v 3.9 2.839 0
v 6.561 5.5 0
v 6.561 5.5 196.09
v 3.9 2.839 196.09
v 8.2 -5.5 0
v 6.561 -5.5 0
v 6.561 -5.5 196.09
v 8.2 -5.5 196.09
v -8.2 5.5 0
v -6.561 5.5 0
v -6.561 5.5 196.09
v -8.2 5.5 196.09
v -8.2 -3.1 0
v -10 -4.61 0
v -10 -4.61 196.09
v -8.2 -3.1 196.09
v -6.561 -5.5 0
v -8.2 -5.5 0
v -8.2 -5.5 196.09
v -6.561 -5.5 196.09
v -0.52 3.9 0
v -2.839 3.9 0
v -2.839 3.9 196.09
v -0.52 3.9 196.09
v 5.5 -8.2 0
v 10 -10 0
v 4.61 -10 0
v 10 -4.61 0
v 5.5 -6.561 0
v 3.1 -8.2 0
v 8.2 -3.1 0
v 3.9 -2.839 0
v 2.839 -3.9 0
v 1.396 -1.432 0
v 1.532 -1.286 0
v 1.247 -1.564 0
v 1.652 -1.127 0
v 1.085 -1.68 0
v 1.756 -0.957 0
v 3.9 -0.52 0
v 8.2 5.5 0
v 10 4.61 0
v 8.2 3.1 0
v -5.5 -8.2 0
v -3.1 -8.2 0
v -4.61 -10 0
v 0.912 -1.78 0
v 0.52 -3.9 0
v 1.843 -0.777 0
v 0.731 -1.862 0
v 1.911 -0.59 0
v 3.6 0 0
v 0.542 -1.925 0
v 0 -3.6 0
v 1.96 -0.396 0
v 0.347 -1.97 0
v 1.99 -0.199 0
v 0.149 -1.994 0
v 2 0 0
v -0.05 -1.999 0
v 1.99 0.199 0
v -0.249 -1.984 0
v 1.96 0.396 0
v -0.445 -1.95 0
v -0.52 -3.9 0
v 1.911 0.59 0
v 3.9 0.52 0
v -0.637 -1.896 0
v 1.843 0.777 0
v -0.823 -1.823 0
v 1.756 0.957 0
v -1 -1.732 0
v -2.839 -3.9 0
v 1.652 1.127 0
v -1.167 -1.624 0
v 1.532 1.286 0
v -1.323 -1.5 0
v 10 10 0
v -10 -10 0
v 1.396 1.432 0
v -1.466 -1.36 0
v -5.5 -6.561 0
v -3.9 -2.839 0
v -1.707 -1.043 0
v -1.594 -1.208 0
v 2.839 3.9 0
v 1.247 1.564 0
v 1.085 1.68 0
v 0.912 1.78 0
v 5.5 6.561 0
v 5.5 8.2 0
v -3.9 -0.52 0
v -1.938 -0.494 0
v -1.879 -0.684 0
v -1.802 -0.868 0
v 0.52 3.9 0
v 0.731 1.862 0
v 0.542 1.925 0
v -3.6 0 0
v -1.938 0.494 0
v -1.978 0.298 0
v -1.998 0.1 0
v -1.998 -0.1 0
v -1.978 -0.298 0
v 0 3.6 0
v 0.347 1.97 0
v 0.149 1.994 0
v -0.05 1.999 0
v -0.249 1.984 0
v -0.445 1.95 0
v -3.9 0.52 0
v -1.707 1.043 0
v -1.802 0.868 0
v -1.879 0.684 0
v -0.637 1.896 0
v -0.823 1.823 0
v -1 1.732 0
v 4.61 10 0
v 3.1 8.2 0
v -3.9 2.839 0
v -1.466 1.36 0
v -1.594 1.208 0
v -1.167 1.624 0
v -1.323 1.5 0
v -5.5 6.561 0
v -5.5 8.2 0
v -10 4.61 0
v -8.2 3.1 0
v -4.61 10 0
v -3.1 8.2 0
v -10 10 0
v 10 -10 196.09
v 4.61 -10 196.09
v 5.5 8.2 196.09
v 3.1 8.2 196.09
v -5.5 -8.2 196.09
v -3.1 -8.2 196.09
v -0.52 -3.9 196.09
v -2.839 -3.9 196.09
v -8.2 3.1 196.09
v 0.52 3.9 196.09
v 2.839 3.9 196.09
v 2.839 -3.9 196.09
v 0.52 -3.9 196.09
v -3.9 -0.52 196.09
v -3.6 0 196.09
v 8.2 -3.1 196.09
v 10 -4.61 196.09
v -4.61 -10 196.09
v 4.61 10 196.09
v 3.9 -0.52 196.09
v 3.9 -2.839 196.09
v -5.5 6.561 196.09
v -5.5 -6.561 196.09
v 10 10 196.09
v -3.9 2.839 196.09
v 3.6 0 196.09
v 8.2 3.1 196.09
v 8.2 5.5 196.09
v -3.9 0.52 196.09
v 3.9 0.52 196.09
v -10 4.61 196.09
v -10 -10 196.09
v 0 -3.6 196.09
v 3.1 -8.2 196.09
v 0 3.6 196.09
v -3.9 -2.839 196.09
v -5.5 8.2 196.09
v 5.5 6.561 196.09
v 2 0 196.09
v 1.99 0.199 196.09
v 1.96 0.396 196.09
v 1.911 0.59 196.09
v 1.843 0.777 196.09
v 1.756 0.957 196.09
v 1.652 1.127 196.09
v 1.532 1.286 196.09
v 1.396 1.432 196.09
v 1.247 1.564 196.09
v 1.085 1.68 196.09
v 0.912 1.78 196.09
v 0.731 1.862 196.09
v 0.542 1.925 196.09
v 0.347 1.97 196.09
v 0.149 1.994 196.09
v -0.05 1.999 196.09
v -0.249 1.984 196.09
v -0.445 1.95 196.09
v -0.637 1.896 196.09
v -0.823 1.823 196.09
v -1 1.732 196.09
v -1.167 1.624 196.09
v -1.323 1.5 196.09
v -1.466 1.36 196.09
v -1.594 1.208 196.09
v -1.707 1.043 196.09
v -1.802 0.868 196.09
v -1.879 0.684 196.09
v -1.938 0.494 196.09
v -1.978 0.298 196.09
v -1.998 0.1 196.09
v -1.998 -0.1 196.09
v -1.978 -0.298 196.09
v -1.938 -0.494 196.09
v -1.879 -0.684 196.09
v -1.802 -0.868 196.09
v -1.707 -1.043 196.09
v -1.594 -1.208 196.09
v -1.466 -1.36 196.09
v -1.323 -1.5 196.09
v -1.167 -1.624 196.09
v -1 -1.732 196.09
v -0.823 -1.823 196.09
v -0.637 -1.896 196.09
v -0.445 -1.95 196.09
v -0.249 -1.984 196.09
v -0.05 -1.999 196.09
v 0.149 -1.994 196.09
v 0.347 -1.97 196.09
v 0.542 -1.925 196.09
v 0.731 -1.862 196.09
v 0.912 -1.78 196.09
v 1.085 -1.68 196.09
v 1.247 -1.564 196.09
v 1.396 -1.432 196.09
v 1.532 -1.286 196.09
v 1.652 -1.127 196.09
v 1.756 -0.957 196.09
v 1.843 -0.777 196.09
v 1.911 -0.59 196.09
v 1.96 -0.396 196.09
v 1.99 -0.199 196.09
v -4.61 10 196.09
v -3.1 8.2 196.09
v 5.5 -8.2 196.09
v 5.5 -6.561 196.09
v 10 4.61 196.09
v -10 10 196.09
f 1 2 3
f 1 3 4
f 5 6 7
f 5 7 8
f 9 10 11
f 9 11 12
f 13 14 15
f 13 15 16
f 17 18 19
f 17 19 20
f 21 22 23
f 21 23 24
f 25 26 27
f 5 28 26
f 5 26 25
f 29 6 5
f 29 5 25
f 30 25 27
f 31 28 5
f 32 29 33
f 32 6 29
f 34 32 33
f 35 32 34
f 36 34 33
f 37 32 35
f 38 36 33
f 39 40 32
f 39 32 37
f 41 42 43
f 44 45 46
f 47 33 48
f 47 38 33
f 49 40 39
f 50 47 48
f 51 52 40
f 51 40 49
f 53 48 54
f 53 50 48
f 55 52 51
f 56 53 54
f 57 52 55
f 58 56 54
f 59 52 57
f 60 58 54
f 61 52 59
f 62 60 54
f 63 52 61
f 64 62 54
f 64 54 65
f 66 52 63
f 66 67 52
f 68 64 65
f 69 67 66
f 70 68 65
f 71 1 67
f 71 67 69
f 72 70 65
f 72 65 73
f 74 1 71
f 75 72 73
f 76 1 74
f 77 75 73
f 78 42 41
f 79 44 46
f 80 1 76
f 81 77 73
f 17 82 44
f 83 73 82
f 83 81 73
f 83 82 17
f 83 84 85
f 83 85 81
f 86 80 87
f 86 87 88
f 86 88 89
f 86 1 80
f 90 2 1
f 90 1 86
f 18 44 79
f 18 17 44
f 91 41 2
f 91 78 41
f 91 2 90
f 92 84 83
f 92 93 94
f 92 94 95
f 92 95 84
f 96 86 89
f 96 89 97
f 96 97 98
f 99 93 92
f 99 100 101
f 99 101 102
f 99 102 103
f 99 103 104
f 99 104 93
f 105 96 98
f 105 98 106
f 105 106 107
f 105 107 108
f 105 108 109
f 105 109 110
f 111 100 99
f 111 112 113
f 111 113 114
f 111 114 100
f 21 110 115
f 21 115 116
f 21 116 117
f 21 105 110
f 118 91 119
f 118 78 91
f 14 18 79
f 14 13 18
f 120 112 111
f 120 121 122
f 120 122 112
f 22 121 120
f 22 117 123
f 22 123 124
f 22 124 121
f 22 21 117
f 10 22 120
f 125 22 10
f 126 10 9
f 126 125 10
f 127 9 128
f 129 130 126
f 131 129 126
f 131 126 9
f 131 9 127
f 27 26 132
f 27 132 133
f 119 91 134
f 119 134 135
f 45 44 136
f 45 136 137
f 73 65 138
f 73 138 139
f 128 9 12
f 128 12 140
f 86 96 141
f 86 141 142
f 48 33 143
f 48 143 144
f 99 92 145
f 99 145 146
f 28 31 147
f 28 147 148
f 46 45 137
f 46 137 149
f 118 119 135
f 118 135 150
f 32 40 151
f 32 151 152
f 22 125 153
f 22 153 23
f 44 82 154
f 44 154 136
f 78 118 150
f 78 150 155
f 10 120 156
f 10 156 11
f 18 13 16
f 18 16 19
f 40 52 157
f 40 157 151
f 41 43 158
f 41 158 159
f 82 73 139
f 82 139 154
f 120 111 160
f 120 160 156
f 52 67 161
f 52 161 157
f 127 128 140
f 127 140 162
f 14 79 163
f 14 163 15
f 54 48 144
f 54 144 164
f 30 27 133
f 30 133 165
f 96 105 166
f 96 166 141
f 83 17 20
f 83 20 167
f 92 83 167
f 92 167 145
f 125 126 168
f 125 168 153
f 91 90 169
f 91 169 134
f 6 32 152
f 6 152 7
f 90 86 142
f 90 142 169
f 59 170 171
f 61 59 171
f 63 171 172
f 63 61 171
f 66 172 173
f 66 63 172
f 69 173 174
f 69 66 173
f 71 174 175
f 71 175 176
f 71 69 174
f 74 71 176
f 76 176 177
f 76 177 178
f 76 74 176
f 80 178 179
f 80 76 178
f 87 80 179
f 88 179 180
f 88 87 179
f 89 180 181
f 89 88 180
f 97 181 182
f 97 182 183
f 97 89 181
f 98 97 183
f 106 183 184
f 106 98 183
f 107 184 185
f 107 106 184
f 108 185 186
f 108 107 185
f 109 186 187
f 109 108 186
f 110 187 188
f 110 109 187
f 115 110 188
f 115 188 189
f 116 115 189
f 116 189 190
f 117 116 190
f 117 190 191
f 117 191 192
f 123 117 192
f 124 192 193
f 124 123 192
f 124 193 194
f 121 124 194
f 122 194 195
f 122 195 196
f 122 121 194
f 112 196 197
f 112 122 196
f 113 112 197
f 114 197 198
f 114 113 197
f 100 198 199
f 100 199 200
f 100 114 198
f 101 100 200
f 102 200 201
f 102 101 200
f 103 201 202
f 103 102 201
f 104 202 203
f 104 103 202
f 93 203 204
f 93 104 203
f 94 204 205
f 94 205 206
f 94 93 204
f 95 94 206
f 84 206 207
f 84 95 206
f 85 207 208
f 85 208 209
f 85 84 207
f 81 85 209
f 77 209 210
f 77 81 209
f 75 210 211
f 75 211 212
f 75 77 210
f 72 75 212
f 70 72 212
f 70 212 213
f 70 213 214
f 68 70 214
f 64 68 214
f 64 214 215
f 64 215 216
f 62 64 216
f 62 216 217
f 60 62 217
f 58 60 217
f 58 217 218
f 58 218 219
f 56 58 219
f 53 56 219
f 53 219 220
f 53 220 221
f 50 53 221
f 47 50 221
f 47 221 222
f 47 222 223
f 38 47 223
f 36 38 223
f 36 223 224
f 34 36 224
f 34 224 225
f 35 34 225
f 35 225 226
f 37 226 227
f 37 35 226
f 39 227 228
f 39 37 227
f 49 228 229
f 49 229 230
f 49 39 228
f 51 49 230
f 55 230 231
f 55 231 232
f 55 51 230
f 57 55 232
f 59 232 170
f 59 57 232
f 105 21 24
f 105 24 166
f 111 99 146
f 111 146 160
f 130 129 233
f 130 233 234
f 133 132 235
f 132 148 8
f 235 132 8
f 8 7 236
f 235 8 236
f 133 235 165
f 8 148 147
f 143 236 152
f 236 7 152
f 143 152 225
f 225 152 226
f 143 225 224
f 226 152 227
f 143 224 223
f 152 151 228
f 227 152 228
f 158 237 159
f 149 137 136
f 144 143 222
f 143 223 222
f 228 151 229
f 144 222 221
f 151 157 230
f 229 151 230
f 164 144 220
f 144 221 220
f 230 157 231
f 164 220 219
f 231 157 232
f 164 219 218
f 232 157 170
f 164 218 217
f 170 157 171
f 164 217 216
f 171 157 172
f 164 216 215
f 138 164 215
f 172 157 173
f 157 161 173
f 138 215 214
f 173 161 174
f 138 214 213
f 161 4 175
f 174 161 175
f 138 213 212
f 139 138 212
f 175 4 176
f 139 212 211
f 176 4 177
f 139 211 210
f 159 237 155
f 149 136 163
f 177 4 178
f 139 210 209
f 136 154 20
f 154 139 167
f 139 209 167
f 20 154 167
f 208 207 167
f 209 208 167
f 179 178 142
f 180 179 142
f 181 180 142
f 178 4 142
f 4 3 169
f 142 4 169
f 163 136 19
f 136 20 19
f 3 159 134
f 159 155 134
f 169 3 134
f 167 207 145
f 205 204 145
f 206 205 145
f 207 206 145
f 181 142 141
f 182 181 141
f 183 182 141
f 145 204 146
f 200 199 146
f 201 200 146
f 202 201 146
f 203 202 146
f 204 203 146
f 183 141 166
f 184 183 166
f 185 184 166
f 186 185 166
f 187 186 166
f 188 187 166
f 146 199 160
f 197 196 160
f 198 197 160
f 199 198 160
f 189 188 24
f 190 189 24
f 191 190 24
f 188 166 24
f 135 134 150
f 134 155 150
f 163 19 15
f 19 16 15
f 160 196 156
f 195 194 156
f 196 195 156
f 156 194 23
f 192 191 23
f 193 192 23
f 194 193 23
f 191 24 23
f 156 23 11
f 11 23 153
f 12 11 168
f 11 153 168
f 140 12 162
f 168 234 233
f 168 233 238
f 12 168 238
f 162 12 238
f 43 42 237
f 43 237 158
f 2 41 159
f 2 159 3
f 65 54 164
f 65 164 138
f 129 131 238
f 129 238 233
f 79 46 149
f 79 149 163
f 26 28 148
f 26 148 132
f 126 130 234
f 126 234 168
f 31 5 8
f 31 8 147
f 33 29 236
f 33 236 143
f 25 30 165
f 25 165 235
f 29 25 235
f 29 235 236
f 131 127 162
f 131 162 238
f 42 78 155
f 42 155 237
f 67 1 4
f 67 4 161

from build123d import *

# Parameters (mm, degrees)
SKETCH1_R           = 2
BOSS_EXTRUDE1_DEPTH = 196.09


with BuildPart() as part:
    # Sketch1 → Boss-Extrude1 (new body)
    with BuildSketch(Plane.XY):
        Polygon((10, 10), (10, 4.610379336), (8.2, 3.1), (8.2, 5.5), (6.560660172, 5.5), (3.9, 2.839339828), (3.9, 0.519615242), (3.6, 0), (3.9, -0.519615242), (3.9, -2.839339828), (6.560660172, -5.5), (8.2, -5.5), (8.2, -3.1), (10, -4.610379336), (10, -10), (4.610379336, -10), (3.1, -8.2), (5.5, -8.2), (5.5, -6.560660172), (2.839339828, -3.9), (0.519615242, -3.9), (0, -3.6), (-0.519615242, -3.9), (-2.839339828, -3.9), (-5.5, -6.560660172), (-5.5, -8.2), (-3.1, -8.2), (-4.610379336, -10), (-10, -10), (-10, -4.610379336), (-8.2, -3.1), (-8.2, -5.5), (-6.560660172, -5.5), (-3.9, -2.839339828), (-3.9, -0.519615242), (-3.6, 0), (-3.9, 0.519615242), (-3.9, 2.839339828), (-6.560660172, 5.5), (-8.2, 5.5), (-8.2, 3.1), (-10, 4.610379336), (-10, 10), (-4.610379336, 10), (-3.1, 8.2), (-5.5, 8.2), (-5.5, 6.560660172), (-2.839339828, 3.9), (-0.519615242, 3.9), (0, 3.6), (0.519615242, 3.9), (2.839339828, 3.9), (5.5, 6.560660172), (5.5, 8.2), (3.1, 8.2), (4.610379336, 10), align=None)
        Circle(SKETCH1_R, mode=Mode.SUBTRACT)
    extrude(amount=BOSS_EXTRUDE1_DEPTH)


solid = part.part
